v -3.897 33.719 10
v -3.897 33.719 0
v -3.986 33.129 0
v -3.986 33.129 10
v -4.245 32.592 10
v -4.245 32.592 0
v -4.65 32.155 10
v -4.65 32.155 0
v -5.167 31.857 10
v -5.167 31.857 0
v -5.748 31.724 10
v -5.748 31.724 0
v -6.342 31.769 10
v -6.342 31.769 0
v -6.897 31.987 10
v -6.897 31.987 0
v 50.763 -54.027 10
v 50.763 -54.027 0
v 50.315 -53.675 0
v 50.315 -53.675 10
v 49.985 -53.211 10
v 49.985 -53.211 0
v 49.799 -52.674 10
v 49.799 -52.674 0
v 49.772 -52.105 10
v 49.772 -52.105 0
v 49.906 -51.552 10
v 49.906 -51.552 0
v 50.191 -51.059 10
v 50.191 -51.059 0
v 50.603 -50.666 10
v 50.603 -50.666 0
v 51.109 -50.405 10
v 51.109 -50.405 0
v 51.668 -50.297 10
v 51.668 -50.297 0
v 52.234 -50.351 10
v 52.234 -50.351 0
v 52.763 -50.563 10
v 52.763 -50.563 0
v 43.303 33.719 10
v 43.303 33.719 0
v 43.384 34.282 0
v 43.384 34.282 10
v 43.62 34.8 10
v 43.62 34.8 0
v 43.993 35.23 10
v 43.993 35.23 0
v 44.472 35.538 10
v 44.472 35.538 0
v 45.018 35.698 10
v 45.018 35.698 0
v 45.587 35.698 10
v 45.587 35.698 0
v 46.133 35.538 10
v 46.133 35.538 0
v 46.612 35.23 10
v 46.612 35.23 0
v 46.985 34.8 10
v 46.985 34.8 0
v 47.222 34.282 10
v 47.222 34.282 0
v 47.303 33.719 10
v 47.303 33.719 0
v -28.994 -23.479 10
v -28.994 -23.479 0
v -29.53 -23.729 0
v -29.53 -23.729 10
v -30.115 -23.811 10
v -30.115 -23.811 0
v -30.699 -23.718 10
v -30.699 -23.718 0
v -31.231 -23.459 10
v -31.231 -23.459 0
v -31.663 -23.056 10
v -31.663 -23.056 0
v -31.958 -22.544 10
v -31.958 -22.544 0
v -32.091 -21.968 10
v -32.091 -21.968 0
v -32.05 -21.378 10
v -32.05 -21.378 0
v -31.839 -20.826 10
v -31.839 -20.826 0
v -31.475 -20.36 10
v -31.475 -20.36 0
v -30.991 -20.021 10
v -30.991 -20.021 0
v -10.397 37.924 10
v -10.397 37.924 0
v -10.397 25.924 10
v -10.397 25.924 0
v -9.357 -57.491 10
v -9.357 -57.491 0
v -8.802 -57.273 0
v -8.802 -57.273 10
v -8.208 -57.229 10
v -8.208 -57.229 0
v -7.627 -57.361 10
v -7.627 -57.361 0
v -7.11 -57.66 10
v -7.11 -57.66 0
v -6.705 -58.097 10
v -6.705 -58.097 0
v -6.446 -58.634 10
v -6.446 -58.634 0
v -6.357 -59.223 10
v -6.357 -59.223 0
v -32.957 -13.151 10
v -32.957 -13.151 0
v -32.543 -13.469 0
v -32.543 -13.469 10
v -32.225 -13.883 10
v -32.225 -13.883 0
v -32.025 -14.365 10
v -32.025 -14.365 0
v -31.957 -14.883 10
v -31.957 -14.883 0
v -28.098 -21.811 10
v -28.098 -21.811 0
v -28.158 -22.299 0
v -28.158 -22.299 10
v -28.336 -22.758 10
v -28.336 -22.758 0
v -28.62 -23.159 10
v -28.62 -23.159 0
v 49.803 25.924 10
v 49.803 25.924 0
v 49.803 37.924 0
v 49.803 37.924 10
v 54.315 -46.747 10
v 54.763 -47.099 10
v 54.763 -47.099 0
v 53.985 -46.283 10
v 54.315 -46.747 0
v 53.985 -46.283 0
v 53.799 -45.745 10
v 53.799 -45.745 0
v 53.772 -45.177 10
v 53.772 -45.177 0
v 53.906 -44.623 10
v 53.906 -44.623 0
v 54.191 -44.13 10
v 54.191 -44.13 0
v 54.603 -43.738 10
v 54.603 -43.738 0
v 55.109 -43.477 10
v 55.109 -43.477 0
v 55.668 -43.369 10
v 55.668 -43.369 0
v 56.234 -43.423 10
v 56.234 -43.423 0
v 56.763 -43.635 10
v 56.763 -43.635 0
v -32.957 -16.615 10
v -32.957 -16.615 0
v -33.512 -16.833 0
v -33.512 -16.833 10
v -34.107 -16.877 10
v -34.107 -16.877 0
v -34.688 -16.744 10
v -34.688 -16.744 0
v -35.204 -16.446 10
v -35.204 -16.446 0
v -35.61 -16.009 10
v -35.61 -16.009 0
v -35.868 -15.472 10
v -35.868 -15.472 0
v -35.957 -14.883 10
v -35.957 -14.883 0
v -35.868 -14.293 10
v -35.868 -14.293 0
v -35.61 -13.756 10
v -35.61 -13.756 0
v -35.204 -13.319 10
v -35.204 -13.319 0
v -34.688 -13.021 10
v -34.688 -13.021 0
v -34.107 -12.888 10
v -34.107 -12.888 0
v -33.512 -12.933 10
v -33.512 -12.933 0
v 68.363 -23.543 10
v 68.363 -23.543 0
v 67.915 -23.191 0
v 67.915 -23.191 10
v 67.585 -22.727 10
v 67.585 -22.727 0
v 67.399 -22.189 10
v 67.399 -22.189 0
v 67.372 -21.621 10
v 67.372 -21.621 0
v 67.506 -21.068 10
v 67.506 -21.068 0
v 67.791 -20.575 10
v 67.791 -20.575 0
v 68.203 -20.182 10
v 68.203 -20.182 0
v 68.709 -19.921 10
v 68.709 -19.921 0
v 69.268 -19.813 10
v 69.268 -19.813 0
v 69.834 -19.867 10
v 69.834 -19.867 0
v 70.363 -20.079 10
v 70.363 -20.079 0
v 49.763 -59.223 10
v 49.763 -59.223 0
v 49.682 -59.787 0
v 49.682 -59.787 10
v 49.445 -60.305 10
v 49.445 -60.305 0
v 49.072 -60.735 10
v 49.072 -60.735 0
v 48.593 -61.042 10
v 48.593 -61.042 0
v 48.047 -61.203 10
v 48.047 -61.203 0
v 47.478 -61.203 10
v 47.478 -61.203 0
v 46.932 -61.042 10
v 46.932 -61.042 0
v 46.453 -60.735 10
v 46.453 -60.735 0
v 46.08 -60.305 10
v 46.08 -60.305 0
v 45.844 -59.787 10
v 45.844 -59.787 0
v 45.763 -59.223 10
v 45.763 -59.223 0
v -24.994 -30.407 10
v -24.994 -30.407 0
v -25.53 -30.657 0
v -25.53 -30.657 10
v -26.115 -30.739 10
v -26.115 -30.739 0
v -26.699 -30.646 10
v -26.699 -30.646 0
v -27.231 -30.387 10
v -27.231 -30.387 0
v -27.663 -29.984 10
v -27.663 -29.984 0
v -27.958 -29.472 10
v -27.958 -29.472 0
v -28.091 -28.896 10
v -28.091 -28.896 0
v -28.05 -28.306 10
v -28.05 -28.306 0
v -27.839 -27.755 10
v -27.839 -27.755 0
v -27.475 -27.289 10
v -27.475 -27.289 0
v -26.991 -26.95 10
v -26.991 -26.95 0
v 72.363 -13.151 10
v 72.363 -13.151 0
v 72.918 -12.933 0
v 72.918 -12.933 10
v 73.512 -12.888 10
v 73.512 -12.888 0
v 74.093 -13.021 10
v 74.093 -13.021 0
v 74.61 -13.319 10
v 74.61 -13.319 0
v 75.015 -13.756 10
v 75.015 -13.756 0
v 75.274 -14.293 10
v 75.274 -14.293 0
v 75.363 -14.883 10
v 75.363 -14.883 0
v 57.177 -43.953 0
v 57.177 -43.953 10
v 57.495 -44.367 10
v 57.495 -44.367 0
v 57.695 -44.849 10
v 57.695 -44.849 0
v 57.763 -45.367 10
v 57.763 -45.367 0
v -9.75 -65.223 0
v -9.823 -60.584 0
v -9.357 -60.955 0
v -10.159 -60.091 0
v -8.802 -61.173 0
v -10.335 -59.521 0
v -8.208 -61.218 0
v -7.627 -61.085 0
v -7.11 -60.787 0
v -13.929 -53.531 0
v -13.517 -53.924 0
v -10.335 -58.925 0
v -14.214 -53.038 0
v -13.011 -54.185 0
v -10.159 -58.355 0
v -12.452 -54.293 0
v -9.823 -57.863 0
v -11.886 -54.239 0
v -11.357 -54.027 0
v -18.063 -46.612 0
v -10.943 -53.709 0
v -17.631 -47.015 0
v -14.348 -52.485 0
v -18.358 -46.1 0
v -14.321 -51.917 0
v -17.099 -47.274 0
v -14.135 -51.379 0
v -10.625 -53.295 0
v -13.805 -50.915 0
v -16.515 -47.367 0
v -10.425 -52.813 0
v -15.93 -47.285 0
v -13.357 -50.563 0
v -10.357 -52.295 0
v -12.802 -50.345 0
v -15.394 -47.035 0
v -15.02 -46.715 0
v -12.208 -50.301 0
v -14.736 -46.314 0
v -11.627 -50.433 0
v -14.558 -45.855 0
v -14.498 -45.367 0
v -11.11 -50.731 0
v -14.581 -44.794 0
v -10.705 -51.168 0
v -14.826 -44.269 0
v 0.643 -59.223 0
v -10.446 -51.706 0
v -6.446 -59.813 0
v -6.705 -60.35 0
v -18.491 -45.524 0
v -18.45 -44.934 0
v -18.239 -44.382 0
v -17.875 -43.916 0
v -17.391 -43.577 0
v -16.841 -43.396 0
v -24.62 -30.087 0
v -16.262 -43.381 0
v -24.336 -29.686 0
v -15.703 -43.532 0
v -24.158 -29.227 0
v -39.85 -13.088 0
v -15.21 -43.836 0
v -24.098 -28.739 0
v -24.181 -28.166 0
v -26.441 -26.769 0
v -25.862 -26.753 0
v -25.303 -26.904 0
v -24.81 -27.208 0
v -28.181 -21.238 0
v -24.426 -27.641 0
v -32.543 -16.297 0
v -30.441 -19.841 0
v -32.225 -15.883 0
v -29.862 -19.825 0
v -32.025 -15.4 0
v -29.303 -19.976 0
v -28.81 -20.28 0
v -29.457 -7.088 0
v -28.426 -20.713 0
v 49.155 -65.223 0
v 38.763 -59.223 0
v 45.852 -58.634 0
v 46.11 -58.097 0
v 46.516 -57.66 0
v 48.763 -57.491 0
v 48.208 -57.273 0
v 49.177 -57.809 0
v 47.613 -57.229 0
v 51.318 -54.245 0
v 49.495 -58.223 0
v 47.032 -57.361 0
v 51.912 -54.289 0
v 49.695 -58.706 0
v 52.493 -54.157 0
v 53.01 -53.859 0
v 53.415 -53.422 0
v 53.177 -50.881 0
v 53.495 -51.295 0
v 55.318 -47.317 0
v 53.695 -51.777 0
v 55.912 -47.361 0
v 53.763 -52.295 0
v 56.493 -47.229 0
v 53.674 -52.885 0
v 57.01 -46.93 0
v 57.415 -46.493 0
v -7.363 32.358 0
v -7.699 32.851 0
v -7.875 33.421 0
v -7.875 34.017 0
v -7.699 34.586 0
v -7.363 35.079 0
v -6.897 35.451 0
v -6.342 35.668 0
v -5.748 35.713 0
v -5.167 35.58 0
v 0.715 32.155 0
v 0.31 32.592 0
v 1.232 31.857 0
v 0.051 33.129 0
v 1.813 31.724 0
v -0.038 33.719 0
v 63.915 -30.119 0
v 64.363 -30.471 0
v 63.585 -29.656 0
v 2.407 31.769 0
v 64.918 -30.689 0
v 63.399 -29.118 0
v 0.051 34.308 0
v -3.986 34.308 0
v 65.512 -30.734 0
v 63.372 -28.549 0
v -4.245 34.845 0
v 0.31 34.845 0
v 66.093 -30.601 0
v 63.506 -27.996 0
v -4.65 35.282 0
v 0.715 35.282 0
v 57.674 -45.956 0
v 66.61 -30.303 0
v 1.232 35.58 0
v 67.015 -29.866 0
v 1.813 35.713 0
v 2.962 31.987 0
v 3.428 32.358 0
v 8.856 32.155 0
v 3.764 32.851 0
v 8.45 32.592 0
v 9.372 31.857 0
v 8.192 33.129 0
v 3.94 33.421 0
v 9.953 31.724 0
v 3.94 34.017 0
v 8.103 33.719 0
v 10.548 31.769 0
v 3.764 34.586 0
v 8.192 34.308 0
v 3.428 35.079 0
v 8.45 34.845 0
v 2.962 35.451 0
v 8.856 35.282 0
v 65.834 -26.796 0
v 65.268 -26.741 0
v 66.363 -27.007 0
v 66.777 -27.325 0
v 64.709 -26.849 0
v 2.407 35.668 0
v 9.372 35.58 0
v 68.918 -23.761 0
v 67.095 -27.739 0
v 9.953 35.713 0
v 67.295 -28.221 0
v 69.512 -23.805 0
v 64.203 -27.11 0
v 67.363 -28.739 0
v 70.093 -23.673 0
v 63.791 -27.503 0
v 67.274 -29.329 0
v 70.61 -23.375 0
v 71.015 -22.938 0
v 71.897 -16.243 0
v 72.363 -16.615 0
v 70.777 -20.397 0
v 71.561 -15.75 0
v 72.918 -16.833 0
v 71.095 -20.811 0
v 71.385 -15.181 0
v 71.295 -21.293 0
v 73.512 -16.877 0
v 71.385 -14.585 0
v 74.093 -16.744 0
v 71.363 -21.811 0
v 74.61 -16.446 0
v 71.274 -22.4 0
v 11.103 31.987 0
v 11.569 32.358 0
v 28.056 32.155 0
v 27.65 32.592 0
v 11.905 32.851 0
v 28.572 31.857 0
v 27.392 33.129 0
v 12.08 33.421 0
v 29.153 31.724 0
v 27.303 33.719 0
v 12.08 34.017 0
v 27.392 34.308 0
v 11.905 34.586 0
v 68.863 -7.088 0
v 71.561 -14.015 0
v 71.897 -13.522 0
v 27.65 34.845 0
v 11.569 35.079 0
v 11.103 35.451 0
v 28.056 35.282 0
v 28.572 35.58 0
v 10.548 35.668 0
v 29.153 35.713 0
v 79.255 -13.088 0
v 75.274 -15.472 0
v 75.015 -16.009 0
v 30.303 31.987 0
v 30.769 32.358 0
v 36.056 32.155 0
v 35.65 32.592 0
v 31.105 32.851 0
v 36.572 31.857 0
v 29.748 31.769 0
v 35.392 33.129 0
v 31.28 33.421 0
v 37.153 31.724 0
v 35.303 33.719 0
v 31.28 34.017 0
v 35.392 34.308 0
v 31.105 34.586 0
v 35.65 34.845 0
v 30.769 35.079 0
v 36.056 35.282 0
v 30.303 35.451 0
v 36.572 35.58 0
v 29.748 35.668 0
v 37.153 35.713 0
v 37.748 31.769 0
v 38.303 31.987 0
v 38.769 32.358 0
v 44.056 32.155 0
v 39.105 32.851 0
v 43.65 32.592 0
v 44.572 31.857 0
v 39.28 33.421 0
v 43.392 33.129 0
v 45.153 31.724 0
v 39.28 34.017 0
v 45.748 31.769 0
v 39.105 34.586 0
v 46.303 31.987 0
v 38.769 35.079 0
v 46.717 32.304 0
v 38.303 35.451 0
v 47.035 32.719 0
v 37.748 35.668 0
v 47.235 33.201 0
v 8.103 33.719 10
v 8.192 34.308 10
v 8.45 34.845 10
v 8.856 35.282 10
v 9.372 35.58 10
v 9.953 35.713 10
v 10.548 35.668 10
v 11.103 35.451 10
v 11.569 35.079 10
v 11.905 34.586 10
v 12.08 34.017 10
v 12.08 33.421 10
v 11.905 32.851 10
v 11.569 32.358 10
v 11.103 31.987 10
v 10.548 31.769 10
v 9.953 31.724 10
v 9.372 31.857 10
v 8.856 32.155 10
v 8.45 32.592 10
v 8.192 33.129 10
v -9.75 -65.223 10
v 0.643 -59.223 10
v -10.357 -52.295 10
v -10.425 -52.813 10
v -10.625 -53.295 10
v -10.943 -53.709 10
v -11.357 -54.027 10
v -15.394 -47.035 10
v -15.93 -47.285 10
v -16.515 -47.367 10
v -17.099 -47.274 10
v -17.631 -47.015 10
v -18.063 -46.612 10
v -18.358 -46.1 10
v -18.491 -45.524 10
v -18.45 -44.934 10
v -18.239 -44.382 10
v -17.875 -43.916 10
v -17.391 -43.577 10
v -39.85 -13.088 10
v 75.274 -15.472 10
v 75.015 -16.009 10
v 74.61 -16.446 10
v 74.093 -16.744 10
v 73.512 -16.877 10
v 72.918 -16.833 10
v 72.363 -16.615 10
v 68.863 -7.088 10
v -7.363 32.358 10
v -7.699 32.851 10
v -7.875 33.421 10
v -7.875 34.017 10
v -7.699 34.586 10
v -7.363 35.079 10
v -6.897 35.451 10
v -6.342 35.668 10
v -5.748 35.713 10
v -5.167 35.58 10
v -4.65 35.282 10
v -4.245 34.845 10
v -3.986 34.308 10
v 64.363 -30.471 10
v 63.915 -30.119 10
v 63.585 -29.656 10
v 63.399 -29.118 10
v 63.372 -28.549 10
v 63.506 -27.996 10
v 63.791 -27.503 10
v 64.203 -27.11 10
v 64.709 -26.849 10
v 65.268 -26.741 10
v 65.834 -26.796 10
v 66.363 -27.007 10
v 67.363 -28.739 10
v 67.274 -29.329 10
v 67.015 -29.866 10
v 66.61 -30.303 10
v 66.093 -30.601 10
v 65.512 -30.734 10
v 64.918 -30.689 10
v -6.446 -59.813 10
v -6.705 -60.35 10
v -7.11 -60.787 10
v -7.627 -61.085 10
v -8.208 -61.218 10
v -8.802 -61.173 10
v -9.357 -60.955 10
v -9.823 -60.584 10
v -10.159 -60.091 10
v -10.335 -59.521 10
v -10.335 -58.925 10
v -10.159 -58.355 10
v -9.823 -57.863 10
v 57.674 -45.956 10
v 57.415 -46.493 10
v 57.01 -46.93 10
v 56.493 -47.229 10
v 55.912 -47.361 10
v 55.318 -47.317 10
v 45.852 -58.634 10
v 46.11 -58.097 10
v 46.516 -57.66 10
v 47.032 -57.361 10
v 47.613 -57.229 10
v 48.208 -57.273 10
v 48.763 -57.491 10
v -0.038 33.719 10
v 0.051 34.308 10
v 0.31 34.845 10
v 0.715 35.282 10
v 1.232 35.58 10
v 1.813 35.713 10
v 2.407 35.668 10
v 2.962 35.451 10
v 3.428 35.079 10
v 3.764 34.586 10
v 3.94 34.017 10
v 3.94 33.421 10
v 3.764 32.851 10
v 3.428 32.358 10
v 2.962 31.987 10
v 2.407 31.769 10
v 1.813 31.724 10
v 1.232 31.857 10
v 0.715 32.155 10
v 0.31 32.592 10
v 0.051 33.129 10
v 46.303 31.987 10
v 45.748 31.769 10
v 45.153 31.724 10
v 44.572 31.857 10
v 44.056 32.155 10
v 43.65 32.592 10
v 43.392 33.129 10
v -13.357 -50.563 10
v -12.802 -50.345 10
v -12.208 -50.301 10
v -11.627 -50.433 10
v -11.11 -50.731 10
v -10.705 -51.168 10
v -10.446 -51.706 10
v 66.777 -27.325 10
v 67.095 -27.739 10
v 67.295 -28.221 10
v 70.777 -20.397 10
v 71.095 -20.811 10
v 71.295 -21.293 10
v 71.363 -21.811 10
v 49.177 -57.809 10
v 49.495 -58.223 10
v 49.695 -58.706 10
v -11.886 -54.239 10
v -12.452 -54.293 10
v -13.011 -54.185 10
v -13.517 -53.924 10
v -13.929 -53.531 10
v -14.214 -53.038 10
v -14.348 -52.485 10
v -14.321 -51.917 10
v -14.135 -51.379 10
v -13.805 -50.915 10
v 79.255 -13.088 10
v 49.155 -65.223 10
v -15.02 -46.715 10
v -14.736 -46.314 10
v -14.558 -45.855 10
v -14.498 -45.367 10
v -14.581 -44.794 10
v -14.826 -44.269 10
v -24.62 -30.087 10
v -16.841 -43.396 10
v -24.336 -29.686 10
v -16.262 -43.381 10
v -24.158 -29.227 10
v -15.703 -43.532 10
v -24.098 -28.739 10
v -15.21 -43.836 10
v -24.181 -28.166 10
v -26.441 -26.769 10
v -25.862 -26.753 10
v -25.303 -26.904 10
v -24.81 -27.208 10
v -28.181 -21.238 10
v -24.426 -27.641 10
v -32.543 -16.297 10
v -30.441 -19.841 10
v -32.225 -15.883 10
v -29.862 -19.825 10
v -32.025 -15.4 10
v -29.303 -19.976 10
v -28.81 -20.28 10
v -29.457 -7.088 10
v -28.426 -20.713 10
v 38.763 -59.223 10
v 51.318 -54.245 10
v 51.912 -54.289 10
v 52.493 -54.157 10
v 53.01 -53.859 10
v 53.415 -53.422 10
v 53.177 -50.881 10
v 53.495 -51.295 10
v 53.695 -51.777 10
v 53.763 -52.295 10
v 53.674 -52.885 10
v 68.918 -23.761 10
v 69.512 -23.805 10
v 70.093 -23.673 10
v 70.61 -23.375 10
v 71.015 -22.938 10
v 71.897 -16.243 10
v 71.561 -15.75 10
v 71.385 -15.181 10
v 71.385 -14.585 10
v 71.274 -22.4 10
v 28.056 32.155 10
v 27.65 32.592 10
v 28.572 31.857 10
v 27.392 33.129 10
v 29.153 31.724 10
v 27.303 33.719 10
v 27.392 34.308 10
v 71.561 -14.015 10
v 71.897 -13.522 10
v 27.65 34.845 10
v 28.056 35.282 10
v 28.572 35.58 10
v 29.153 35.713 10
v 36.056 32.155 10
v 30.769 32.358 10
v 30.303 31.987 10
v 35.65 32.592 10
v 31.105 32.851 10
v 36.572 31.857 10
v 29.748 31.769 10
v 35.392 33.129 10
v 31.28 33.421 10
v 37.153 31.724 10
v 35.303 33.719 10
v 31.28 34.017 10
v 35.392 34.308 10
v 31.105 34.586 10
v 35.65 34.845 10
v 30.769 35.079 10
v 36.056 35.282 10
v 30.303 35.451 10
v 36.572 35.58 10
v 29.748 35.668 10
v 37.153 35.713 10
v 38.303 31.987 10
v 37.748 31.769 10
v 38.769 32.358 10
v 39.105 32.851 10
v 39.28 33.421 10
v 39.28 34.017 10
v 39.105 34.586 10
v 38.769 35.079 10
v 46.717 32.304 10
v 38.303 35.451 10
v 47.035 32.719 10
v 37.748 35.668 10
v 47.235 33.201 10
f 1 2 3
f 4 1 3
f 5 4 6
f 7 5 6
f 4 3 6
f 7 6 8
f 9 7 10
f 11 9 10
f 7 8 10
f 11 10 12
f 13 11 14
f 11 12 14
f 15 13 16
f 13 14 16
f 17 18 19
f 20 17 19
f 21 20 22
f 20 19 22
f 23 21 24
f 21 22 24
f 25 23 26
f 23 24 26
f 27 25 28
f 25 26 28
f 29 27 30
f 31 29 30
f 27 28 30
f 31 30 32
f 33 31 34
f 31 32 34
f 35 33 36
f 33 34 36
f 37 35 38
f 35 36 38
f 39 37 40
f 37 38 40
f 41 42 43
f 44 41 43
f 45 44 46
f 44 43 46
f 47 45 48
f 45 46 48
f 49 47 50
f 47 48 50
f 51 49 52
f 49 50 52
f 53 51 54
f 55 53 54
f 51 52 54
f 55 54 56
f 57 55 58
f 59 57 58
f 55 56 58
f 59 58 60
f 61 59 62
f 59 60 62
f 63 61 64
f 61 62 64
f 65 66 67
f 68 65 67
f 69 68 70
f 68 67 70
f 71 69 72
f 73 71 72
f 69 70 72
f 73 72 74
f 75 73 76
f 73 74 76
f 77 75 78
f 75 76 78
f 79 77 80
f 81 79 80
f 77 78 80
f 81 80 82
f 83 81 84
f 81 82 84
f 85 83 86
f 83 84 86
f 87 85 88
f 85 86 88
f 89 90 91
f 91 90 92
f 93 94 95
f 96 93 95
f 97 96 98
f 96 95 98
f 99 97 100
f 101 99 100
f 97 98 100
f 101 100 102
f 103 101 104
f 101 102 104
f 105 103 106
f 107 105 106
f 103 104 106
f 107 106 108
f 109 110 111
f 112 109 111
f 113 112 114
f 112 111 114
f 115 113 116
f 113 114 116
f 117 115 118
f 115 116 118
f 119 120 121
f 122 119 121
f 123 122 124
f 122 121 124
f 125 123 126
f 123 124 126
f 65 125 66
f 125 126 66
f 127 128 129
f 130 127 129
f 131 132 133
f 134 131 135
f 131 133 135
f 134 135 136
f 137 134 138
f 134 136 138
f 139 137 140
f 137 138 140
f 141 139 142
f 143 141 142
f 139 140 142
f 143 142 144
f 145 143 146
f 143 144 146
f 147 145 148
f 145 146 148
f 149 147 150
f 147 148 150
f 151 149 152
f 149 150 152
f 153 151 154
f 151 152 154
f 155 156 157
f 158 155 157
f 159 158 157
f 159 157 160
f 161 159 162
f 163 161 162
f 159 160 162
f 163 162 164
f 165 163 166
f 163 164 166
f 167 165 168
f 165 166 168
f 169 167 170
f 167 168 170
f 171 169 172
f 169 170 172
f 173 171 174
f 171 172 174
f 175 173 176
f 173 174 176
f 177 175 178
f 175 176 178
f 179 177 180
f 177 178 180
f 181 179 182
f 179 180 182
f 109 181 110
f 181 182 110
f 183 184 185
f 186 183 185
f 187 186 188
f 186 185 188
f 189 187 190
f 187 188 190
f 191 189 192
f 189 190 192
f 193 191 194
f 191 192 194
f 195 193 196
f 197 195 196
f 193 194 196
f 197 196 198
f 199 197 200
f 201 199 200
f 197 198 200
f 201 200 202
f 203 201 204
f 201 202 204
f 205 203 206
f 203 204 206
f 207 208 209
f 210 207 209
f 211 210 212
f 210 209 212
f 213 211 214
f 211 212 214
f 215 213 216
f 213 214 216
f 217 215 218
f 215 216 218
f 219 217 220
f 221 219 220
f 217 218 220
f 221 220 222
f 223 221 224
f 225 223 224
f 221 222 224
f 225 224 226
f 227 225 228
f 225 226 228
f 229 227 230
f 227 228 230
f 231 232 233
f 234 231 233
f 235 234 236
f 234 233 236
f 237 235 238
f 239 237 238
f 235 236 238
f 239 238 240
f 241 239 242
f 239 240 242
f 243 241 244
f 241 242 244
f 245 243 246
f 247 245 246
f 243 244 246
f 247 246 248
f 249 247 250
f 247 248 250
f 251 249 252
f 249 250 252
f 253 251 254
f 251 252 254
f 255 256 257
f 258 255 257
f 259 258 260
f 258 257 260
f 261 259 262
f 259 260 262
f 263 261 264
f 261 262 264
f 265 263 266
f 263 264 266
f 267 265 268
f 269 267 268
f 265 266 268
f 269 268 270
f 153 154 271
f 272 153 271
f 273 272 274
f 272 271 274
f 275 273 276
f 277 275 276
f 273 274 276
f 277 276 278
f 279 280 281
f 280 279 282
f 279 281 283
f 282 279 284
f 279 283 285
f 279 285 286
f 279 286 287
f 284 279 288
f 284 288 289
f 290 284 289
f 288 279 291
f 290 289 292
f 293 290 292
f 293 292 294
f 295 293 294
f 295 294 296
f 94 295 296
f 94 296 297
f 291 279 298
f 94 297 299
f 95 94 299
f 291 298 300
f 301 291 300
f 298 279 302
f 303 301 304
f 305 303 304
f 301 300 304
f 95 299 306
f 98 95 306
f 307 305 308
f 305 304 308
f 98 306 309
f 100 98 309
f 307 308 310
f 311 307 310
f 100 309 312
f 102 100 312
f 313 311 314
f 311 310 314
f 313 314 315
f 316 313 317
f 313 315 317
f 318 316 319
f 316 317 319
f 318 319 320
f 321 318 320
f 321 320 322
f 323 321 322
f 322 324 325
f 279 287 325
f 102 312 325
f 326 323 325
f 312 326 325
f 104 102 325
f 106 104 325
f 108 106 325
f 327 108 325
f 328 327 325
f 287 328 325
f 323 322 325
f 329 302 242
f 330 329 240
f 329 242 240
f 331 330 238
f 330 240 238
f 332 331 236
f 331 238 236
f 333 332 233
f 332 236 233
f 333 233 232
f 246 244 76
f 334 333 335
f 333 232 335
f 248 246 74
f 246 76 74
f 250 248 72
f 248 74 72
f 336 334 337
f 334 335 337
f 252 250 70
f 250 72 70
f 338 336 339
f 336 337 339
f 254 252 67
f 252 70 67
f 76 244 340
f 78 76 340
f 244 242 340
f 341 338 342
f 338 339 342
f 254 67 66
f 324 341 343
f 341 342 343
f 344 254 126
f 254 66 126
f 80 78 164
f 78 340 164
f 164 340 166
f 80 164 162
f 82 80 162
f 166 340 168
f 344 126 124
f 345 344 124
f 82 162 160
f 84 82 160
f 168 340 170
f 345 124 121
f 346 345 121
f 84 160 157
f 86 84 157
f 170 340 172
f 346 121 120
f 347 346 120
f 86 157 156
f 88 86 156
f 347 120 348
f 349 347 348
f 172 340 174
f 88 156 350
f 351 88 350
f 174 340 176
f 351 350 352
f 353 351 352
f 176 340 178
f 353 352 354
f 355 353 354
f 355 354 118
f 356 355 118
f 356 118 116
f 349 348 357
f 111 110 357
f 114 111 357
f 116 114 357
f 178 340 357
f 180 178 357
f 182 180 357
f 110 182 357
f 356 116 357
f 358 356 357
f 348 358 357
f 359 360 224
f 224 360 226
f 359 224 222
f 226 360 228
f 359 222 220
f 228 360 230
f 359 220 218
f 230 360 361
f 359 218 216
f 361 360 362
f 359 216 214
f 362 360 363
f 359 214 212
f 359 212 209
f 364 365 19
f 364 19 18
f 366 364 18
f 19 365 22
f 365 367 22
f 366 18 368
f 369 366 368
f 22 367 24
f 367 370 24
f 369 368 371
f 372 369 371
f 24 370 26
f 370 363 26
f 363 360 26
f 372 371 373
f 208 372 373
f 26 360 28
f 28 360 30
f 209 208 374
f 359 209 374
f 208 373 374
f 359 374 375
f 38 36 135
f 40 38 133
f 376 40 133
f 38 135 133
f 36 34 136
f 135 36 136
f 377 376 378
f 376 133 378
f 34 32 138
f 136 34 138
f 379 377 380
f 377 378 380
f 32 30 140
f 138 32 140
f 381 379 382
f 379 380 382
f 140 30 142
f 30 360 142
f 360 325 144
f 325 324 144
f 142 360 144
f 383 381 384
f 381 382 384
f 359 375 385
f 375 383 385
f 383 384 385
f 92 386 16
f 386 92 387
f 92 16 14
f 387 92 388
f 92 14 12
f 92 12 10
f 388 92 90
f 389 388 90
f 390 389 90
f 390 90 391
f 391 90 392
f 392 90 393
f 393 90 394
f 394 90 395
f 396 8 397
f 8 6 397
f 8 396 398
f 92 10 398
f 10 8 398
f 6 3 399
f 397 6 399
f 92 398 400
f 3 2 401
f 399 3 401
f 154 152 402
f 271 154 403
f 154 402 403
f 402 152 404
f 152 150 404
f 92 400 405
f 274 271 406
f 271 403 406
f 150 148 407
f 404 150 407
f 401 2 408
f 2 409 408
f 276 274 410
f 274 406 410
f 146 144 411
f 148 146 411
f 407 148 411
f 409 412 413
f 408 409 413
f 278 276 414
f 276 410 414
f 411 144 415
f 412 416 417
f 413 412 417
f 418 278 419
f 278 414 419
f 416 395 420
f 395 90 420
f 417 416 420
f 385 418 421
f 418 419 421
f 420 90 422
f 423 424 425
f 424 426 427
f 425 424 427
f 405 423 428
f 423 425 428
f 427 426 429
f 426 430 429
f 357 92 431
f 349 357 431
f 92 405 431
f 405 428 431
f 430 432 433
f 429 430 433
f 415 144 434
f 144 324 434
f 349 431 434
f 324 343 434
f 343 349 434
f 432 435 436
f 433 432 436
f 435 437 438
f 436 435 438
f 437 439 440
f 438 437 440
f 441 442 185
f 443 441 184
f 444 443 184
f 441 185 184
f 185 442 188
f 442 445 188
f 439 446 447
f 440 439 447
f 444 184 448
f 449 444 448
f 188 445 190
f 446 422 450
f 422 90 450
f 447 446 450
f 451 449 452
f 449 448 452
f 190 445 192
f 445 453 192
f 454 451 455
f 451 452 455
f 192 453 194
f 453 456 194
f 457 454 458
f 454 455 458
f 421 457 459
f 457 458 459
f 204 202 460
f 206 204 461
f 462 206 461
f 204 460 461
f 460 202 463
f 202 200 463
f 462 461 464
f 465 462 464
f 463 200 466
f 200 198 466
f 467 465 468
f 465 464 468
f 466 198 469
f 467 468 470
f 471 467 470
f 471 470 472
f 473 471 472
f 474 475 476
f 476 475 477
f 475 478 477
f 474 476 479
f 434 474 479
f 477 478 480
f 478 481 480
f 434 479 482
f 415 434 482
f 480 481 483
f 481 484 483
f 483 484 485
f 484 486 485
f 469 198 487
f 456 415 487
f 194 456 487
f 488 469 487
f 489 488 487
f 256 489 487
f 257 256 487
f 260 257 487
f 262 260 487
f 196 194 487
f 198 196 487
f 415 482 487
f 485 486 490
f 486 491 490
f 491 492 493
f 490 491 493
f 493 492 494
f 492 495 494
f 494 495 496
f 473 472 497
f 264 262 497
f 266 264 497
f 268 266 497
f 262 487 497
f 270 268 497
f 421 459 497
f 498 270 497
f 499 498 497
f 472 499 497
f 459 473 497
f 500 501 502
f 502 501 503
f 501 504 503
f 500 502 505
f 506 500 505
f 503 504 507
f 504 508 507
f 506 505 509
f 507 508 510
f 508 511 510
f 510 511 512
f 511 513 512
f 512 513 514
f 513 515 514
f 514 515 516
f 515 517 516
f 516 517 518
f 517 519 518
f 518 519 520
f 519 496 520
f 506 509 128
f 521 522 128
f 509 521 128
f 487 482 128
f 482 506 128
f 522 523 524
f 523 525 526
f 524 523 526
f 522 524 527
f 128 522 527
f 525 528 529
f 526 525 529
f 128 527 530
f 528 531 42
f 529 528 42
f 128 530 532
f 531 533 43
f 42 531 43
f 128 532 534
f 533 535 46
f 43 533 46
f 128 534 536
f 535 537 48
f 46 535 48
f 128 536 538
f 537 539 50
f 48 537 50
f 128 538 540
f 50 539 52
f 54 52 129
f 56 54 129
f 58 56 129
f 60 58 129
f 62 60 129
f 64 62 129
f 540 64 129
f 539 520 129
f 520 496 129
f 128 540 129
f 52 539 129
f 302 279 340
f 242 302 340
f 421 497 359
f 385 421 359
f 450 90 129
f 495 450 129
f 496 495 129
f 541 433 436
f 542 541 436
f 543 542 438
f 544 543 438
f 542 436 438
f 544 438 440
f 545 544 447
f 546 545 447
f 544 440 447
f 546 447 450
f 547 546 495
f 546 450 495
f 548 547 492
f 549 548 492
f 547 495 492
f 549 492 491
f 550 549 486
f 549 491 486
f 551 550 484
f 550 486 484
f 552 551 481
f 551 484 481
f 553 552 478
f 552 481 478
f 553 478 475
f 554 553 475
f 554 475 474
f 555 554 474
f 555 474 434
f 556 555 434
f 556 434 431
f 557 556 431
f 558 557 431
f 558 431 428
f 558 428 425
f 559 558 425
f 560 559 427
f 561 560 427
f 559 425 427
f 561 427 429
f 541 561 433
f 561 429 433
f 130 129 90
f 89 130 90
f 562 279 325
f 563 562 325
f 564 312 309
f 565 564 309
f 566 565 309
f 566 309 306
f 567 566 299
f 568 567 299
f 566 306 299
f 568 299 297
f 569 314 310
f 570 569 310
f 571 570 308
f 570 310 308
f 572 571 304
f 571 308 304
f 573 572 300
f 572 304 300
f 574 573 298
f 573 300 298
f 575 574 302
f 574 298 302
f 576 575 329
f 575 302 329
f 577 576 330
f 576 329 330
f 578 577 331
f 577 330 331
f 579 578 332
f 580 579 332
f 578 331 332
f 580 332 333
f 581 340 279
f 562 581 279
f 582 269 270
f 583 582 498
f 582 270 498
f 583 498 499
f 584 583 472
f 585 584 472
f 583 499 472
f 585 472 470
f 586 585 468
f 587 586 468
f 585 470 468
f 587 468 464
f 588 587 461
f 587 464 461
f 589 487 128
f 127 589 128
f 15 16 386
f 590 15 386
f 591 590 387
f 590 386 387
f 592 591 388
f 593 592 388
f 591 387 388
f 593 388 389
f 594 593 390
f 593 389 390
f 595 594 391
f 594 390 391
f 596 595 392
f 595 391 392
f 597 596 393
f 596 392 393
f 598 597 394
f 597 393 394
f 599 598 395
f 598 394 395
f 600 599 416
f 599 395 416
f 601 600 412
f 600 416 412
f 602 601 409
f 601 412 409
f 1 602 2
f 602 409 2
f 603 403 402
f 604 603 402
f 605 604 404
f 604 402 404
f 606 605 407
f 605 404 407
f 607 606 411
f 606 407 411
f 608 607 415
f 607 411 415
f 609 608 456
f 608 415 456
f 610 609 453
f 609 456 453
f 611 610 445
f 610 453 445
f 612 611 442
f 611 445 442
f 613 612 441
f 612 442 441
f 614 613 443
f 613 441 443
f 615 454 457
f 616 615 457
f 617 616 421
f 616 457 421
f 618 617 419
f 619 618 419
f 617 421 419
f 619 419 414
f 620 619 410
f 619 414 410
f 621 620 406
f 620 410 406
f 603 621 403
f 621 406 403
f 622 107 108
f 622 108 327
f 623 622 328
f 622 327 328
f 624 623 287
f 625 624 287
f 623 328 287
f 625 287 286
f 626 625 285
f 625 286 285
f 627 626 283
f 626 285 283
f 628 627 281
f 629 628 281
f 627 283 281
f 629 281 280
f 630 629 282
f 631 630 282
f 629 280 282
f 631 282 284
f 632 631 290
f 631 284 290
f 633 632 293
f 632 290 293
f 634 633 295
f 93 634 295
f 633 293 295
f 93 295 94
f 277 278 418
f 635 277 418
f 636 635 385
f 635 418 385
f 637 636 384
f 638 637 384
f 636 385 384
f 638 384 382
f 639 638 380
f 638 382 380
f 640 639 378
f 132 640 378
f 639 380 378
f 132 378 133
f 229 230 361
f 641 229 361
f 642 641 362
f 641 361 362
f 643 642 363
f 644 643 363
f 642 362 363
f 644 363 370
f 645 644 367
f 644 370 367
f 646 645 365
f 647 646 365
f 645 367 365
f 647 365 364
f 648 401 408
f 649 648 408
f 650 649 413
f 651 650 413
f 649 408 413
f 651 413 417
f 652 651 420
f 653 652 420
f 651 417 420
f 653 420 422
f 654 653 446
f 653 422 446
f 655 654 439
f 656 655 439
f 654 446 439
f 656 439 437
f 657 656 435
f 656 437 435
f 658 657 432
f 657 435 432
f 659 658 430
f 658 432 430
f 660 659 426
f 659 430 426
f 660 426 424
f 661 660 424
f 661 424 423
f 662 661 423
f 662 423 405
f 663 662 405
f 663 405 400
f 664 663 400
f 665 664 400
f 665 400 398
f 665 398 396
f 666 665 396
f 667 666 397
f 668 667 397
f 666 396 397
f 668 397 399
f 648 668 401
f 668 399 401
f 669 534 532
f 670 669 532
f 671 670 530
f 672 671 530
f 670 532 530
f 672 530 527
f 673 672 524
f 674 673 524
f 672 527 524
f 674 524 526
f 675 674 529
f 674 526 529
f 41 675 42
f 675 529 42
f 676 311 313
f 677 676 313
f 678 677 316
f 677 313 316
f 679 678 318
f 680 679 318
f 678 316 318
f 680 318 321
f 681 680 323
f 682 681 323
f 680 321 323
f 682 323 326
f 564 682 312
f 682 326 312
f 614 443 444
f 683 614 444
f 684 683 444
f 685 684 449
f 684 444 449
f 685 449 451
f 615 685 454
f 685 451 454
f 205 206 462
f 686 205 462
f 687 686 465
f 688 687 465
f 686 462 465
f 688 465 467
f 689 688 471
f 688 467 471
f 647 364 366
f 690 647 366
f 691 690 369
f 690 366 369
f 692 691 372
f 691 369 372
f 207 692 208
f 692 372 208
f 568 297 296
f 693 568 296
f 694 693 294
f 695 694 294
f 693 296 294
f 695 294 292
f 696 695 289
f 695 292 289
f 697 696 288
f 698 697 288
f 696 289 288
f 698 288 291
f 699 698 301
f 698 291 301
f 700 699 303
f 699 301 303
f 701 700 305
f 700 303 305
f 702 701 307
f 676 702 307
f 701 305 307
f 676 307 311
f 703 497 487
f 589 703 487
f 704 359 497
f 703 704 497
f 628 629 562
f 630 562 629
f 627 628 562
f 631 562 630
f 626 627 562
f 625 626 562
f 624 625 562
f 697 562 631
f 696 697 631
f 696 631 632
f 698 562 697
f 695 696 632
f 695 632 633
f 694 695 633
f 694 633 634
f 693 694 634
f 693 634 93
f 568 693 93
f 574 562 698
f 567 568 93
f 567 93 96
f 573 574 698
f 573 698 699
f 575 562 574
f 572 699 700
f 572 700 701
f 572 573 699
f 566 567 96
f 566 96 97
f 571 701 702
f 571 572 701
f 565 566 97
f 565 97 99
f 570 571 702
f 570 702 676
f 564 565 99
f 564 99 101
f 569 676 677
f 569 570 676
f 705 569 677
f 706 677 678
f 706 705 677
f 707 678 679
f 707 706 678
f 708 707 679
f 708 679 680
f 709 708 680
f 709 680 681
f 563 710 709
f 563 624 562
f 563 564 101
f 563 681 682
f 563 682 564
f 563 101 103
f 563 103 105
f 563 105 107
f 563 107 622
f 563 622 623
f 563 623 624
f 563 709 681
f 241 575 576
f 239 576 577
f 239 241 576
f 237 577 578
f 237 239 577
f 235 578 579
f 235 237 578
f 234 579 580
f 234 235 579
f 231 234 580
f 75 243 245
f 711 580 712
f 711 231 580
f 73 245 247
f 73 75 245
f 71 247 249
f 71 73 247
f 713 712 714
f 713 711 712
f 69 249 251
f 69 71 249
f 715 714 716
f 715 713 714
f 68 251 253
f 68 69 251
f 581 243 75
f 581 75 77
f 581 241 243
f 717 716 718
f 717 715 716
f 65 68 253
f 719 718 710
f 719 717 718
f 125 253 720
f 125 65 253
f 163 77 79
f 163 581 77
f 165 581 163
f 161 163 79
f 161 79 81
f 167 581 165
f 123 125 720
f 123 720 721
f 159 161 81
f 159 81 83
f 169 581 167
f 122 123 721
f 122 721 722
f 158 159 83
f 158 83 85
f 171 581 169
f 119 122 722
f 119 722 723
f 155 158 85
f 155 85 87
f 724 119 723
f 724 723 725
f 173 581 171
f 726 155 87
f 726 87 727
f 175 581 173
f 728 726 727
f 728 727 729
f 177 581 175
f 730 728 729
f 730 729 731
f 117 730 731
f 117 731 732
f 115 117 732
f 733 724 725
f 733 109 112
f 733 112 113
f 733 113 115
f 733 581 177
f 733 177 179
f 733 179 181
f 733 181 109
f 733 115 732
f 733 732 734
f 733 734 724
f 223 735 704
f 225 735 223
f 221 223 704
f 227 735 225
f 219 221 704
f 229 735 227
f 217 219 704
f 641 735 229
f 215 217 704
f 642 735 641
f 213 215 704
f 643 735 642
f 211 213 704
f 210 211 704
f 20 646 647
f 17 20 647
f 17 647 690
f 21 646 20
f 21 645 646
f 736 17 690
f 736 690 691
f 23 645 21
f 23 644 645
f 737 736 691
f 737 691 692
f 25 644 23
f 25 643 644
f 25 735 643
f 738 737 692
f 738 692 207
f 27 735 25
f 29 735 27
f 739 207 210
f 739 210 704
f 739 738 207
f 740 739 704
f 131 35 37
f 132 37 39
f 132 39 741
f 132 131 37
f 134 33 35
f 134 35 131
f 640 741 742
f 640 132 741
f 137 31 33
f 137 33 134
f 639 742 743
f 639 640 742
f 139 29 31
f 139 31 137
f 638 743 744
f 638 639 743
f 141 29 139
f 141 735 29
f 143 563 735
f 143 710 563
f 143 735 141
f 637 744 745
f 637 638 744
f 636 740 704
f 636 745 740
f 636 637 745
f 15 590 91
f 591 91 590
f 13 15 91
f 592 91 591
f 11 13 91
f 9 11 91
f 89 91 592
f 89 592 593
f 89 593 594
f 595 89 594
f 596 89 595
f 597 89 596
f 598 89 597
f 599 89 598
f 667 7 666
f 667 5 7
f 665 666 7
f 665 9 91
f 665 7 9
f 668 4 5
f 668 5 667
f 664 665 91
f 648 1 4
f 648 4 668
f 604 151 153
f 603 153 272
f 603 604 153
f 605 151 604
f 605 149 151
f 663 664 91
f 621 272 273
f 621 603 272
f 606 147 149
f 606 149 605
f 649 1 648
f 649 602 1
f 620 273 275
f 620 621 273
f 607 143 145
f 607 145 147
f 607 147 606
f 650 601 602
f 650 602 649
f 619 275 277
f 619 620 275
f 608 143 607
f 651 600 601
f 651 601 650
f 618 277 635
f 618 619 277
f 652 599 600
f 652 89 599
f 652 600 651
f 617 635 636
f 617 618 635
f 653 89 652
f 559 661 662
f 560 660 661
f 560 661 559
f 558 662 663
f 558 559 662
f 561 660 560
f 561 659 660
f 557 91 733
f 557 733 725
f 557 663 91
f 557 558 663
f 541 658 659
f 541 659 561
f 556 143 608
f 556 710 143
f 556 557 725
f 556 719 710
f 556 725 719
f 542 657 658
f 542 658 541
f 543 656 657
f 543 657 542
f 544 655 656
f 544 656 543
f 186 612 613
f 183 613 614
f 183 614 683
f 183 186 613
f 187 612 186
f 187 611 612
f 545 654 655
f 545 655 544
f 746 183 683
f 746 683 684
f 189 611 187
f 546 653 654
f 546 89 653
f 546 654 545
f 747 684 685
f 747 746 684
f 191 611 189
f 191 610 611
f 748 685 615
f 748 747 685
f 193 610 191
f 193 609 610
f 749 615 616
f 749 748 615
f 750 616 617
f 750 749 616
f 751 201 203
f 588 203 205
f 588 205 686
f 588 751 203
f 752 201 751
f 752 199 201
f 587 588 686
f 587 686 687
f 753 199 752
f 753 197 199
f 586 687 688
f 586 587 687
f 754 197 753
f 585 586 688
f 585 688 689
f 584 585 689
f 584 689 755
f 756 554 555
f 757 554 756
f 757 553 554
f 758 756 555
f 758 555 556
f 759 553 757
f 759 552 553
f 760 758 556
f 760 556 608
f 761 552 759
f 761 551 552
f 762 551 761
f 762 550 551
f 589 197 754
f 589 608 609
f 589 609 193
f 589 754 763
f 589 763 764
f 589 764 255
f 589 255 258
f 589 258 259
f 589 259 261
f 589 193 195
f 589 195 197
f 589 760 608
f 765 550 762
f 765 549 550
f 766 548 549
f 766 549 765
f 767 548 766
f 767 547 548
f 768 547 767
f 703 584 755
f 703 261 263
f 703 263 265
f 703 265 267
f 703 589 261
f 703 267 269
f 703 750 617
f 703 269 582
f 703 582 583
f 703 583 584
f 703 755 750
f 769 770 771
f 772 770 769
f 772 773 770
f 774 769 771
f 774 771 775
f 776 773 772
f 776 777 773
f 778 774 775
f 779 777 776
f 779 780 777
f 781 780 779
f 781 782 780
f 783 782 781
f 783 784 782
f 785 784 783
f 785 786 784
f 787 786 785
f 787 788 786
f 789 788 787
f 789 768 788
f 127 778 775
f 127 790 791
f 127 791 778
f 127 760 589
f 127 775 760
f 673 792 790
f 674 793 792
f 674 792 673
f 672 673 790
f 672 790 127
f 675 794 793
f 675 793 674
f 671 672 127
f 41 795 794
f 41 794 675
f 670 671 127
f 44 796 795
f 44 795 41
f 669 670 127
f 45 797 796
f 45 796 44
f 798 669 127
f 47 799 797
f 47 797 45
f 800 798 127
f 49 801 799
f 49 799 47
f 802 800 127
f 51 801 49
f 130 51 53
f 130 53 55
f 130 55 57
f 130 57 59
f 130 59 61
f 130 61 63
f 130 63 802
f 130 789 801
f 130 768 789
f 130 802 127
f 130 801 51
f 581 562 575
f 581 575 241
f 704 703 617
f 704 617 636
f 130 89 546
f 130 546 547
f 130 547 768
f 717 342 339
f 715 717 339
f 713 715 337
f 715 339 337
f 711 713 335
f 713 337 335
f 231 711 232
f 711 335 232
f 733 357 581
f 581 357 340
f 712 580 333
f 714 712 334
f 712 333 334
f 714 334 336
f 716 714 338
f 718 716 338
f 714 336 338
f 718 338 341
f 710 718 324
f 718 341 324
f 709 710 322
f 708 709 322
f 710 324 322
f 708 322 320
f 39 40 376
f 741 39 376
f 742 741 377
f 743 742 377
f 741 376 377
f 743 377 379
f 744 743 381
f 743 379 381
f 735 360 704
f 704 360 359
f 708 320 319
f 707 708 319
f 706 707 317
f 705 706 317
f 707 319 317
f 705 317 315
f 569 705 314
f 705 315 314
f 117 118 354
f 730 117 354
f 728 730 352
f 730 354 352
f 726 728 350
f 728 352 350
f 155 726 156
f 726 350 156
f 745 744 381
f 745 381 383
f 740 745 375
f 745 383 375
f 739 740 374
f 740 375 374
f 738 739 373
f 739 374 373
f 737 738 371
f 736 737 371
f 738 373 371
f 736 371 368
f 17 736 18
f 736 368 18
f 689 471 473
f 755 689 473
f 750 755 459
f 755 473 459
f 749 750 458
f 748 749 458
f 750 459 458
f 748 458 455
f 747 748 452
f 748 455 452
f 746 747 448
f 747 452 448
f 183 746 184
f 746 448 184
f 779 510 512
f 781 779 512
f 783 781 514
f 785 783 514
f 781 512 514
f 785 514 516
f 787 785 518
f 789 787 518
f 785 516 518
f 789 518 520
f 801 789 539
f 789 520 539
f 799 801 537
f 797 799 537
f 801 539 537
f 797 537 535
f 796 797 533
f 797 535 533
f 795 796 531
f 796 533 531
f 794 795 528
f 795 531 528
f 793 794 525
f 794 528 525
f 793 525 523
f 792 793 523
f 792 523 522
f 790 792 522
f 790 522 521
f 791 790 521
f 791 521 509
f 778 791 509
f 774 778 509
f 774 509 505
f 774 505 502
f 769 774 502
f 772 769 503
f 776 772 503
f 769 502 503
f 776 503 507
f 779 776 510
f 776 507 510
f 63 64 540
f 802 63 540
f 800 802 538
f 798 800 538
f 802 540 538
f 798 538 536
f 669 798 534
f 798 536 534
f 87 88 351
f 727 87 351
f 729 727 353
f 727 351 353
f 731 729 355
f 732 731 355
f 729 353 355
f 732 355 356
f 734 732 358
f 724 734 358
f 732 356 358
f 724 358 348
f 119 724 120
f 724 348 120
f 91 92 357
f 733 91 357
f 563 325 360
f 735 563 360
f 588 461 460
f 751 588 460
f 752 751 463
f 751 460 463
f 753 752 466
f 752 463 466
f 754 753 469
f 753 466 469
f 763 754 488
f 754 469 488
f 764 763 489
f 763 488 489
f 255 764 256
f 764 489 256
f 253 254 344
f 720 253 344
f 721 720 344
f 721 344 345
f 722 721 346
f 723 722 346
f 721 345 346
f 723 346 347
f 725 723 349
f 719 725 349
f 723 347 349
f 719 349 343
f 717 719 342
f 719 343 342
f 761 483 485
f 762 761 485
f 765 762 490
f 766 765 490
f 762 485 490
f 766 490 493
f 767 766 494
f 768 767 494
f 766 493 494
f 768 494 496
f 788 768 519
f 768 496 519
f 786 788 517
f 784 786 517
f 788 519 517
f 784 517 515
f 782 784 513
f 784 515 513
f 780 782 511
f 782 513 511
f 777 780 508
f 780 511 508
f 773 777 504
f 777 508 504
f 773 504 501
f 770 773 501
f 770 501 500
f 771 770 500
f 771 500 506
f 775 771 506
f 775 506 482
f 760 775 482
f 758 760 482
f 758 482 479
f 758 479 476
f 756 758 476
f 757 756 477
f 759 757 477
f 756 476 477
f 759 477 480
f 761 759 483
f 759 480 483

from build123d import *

# Parameters (mm, degrees)
EXTRUDE_4_DEPTH = 10


with BuildPart() as part:
    # 草圖1 → 填料-伸長4 (new body)
    with BuildSketch(Plane.XY):
        Polygon((49.802669845, 25.924393386), (-10.397330155, 25.924393386), (-29.457330155, -7.088495007), (0.642669845, -59.223224314), (38.762669845, -59.223224314), (68.862669845, -7.088495007), align=None)
        with BuildLine():
            Line((-0.037670798, 33.71862202), (-3.897330155, 33.71862202))
            ThreePointArc((-3.897330155, 33.71862202), (-4.897330155, 31.986571212), (-6.897330155, 31.986571212))
            Line((-6.897330155, 31.986571212), (-10.397330155, 25.924393386))
            Line((-10.397330155, 25.924393386), (49.802669845, 25.924393386))
            Line((49.802669845, 25.924393386), (46.302669845, 31.986571212))
            ThreePointArc((46.302669845, 31.986571212), (44.302669845, 31.986571212), (43.302669845, 33.71862202))
            Line((43.302669845, 33.71862202), (39.302669845, 33.71862202))
            ThreePointArc((39.302669845, 33.71862202), (37.302669845, 31.71862202), (35.302669845, 33.71862202))
            Line((35.302669845, 33.71862202), (31.302669845, 33.71862202))
            ThreePointArc((31.302669845, 33.71862202), (29.302669845, 31.71862202), (27.302669845, 33.71862202))
            Line((27.302669845, 33.71862202), (12.102669845, 33.71862202))
            ThreePointArc((12.102669845, 33.71862202), (10.102669845, 31.71862202), (8.102669845, 33.71862202))
            Line((8.102669845, 33.71862202), (3.962329202, 33.71862202))
            ThreePointArc((3.962329202, 33.71862202), (1.962329202, 31.71862202), (-0.037670798, 33.71862202))
        make_face()
        with BuildLine():
            ThreePointArc((-6.897330155, 31.986571212), (-6.897330155, 35.450672827), (-3.897330155, 33.71862202))
            Line((-3.897330155, 33.71862202), (-0.037670798, 33.71862202))
            ThreePointArc((-0.037670798, 33.71862202), (1.962329202, 35.71862202), (3.962329202, 33.71862202))
            Line((3.962329202, 33.71862202), (8.102669845, 33.71862202))
            ThreePointArc((8.102669845, 33.71862202), (10.102669845, 35.71862202), (12.102669845, 33.71862202))
            Line((12.102669845, 33.71862202), (27.302669845, 33.71862202))
            ThreePointArc((27.302669845, 33.71862202), (29.302669845, 35.71862202), (31.302669845, 33.71862202))
            Line((31.302669845, 33.71862202), (35.302669845, 33.71862202))
            ThreePointArc((35.302669845, 33.71862202), (37.302669845, 35.71862202), (39.302669845, 33.71862202))
            Line((39.302669845, 33.71862202), (43.302669845, 33.71862202))
            ThreePointArc((43.302669845, 33.71862202), (45.302669845, 35.71862202), (47.302669845, 33.71862202))
            ThreePointArc((47.302669845, 33.71862202), (47.034720652, 32.71862202), (46.302669845, 31.986571212))
            Line((46.302669845, 31.986571212), (49.802669845, 25.924393386))
            Line((49.802669845, 25.924393386), (49.802669845, 37.924393386))
            Line((49.802669845, 37.924393386), (-10.397330155, 37.924393386))
            Line((-10.397330155, 37.924393386), (-10.397330155, 25.924393386))
            Line((-10.397330155, 25.924393386), (-6.897330155, 31.986571212))
        make_face()
        with BuildLine():
            Line((-32.957330155, -13.150672833), (-29.457330155, -7.088495007))
            Line((-29.457330155, -7.088495007), (-39.849635001, -13.088495007))
            Line((-39.849635001, -13.088495007), (-9.749635001, -65.223224314))
            Line((-9.749635001, -65.223224314), (0.642669845, -59.223224314))
            Line((0.642669845, -59.223224314), (-6.357330155, -59.223224314))
            ThreePointArc((-6.357330155, -59.223224314), (-9.357330155, -60.955275122), (-9.357330155, -57.491173507))
            Line((-9.357330155, -57.491173507), (-11.357330155, -54.027071892))
            ThreePointArc((-11.357330155, -54.027071892), (-14.089380963, -53.295021084), (-13.357330155, -50.562970277))
            Line((-13.357330155, -50.562970277), (-15.394263476, -47.034898273))
            ThreePointArc((-15.394263476, -47.034898273), (-18.229721605, -46.366817854), (-17.390567155, -43.577198874))
            Line((-17.390567155, -43.577198874), (-24.994263476, -30.40721052))
            ThreePointArc((-24.994263476, -30.40721052), (-27.829721605, -29.739130101), (-26.990567155, -26.949511121))
            Line((-26.990567155, -26.949511121), (-28.994263476, -23.47900729))
            ThreePointArc((-28.994263476, -23.47900729), (-31.829721605, -22.810926871), (-30.990567155, -20.021307891))
            Line((-30.990567155, -20.021307891), (-32.957330155, -16.614774448))
            ThreePointArc((-32.957330155, -16.614774448), (-35.957330155, -14.882723641), (-32.957330155, -13.150672833))
        make_face()
        with BuildLine():
            Line((0.642669845, -59.223224314), (-29.457330155, -7.088495007))
            Line((-29.457330155, -7.088495007), (-32.957330155, -13.150672833))
            ThreePointArc((-32.957330155, -13.150672833), (-32.225279348, -13.882723641), (-31.957330155, -14.882723641))
            ThreePointArc((-31.957330155, -14.882723641), (-32.225279348, -15.882723641), (-32.957330155, -16.614774448))
            Line((-32.957330155, -16.614774448), (-30.990567155, -20.021307891))
            ThreePointArc((-30.990567155, -20.021307891), (-29.045480871, -20.110075214), (-28.097670798, -21.810926871))
            ThreePointArc((-28.097670798, -21.810926871), (-28.336021763, -22.75781265), (-28.994263476, -23.47900729))
            Line((-28.994263476, -23.47900729), (-26.990567155, -26.949511121))
            ThreePointArc((-26.990567155, -26.949511121), (-25.045480871, -27.038278445), (-24.097670798, -28.739130101))
            ThreePointArc((-24.097670798, -28.739130101), (-24.336021763, -29.68601588), (-24.994263476, -30.40721052))
            Line((-24.994263476, -30.40721052), (-17.390567155, -43.577198874))
            ThreePointArc((-17.390567155, -43.577198874), (-15.445480871, -43.665966197), (-14.497670798, -45.366817854))
            ThreePointArc((-14.497670798, -45.366817854), (-14.736021763, -46.313703633), (-15.394263476, -47.034898273))
            Line((-15.394263476, -47.034898273), (-13.357330155, -50.562970277))
            ThreePointArc((-13.357330155, -50.562970277), (-11.357330155, -50.562970277), (-10.357330155, -52.295021084))
            ThreePointArc((-10.357330155, -52.295021084), (-10.625279348, -53.295021084), (-11.357330155, -54.027071892))
            Line((-11.357330155, -54.027071892), (-9.357330155, -57.491173507))
            ThreePointArc((-9.357330155, -57.491173507), (-7.357330155, -57.491173507), (-6.357330155, -59.223224314))
            Line((-6.357330155, -59.223224314), (0.642669845, -59.223224314))
        make_face()
        with BuildLine():
            Line((79.25497469, -13.088495007), (68.862669845, -7.088495007))
            Line((68.862669845, -7.088495007), (72.362669845, -13.150672833))
            ThreePointArc((72.362669845, -13.150672833), (74.362669845, -13.150672833), (75.362669845, -14.882723641))
            ThreePointArc((75.362669845, -14.882723641), (74.362669845, -16.614774448), (72.362669845, -16.614774448))
            Line((72.362669845, -16.614774448), (70.362669845, -20.078876063))
            ThreePointArc((70.362669845, -20.078876063), (71.094720652, -20.810926871), (71.362669845, -21.810926871))
            ThreePointArc((71.362669845, -21.810926871), (70.362669845, -23.542977679), (68.362669845, -23.542977679))
            Line((68.362669845, -23.542977679), (66.362669845, -27.007079294))
            ThreePointArc((66.362669845, -27.007079294), (67.094720652, -27.739130101), (67.362669845, -28.739130101))
            ThreePointArc((67.362669845, -28.739130101), (66.362669845, -30.471180909), (64.362669845, -30.471180909))
            Line((64.362669845, -30.471180909), (56.762669845, -43.634767046))
            ThreePointArc((56.762669845, -43.634767046), (57.494720652, -44.366817854), (57.762669845, -45.366817854))
            ThreePointArc((57.762669845, -45.366817854), (56.762669845, -47.098868661), (54.762669845, -47.098868661))
            Line((54.762669845, -47.098868661), (52.762669845, -50.562970277))
            ThreePointArc((52.762669845, -50.562970277), (53.494720652, -51.295021084), (53.762669845, -52.295021084))
            ThreePointArc((53.762669845, -52.295021084), (52.762669845, -54.027071892), (50.762669845, -54.027071892))
            Line((50.762669845, -54.027071892), (48.762669845, -57.491173507))
            ThreePointArc((48.762669845, -57.491173507), (49.494720652, -58.223224314), (49.762669845, -59.223224314))
            ThreePointArc((49.762669845, -59.223224314), (47.762669845, -61.223224314), (45.762669845, -59.223224314))
            Line((45.762669845, -59.223224314), (38.762669845, -59.223224314))
            Line((38.762669845, -59.223224314), (49.15497469, -65.223224314))
            Line((49.15497469, -65.223224314), (79.25497469, -13.088495007))
        make_face()
        with BuildLine():
            Line((72.362669845, -13.150672833), (68.862669845, -7.088495007))
            Line((68.862669845, -7.088495007), (38.762669845, -59.223224314))
            Line((38.762669845, -59.223224314), (45.762669845, -59.223224314))
            ThreePointArc((45.762669845, -59.223224314), (46.762669845, -57.491173507), (48.762669845, -57.491173507))
            Line((48.762669845, -57.491173507), (50.762669845, -54.027071892))
            ThreePointArc((50.762669845, -54.027071892), (50.030619037, -51.295021084), (52.762669845, -50.562970277))
            Line((52.762669845, -50.562970277), (54.762669845, -47.098868661))
            ThreePointArc((54.762669845, -47.098868661), (54.030619037, -44.366817854), (56.762669845, -43.634767046))
            Line((56.762669845, -43.634767046), (64.362669845, -30.471180909))
            ThreePointArc((64.362669845, -30.471180909), (63.630619037, -27.739130101), (66.362669845, -27.007079294))
            Line((66.362669845, -27.007079294), (68.362669845, -23.542977679))
            ThreePointArc((68.362669845, -23.542977679), (67.630619037, -20.810926871), (70.362669845, -20.078876063))
            Line((70.362669845, -20.078876063), (72.362669845, -16.614774448))
            ThreePointArc((72.362669845, -16.614774448), (71.362669845, -14.882723641), (72.362669845, -13.150672833))
        make_face()
    extrude(amount=EXTRUDE_4_DEPTH)


solid = part.part
